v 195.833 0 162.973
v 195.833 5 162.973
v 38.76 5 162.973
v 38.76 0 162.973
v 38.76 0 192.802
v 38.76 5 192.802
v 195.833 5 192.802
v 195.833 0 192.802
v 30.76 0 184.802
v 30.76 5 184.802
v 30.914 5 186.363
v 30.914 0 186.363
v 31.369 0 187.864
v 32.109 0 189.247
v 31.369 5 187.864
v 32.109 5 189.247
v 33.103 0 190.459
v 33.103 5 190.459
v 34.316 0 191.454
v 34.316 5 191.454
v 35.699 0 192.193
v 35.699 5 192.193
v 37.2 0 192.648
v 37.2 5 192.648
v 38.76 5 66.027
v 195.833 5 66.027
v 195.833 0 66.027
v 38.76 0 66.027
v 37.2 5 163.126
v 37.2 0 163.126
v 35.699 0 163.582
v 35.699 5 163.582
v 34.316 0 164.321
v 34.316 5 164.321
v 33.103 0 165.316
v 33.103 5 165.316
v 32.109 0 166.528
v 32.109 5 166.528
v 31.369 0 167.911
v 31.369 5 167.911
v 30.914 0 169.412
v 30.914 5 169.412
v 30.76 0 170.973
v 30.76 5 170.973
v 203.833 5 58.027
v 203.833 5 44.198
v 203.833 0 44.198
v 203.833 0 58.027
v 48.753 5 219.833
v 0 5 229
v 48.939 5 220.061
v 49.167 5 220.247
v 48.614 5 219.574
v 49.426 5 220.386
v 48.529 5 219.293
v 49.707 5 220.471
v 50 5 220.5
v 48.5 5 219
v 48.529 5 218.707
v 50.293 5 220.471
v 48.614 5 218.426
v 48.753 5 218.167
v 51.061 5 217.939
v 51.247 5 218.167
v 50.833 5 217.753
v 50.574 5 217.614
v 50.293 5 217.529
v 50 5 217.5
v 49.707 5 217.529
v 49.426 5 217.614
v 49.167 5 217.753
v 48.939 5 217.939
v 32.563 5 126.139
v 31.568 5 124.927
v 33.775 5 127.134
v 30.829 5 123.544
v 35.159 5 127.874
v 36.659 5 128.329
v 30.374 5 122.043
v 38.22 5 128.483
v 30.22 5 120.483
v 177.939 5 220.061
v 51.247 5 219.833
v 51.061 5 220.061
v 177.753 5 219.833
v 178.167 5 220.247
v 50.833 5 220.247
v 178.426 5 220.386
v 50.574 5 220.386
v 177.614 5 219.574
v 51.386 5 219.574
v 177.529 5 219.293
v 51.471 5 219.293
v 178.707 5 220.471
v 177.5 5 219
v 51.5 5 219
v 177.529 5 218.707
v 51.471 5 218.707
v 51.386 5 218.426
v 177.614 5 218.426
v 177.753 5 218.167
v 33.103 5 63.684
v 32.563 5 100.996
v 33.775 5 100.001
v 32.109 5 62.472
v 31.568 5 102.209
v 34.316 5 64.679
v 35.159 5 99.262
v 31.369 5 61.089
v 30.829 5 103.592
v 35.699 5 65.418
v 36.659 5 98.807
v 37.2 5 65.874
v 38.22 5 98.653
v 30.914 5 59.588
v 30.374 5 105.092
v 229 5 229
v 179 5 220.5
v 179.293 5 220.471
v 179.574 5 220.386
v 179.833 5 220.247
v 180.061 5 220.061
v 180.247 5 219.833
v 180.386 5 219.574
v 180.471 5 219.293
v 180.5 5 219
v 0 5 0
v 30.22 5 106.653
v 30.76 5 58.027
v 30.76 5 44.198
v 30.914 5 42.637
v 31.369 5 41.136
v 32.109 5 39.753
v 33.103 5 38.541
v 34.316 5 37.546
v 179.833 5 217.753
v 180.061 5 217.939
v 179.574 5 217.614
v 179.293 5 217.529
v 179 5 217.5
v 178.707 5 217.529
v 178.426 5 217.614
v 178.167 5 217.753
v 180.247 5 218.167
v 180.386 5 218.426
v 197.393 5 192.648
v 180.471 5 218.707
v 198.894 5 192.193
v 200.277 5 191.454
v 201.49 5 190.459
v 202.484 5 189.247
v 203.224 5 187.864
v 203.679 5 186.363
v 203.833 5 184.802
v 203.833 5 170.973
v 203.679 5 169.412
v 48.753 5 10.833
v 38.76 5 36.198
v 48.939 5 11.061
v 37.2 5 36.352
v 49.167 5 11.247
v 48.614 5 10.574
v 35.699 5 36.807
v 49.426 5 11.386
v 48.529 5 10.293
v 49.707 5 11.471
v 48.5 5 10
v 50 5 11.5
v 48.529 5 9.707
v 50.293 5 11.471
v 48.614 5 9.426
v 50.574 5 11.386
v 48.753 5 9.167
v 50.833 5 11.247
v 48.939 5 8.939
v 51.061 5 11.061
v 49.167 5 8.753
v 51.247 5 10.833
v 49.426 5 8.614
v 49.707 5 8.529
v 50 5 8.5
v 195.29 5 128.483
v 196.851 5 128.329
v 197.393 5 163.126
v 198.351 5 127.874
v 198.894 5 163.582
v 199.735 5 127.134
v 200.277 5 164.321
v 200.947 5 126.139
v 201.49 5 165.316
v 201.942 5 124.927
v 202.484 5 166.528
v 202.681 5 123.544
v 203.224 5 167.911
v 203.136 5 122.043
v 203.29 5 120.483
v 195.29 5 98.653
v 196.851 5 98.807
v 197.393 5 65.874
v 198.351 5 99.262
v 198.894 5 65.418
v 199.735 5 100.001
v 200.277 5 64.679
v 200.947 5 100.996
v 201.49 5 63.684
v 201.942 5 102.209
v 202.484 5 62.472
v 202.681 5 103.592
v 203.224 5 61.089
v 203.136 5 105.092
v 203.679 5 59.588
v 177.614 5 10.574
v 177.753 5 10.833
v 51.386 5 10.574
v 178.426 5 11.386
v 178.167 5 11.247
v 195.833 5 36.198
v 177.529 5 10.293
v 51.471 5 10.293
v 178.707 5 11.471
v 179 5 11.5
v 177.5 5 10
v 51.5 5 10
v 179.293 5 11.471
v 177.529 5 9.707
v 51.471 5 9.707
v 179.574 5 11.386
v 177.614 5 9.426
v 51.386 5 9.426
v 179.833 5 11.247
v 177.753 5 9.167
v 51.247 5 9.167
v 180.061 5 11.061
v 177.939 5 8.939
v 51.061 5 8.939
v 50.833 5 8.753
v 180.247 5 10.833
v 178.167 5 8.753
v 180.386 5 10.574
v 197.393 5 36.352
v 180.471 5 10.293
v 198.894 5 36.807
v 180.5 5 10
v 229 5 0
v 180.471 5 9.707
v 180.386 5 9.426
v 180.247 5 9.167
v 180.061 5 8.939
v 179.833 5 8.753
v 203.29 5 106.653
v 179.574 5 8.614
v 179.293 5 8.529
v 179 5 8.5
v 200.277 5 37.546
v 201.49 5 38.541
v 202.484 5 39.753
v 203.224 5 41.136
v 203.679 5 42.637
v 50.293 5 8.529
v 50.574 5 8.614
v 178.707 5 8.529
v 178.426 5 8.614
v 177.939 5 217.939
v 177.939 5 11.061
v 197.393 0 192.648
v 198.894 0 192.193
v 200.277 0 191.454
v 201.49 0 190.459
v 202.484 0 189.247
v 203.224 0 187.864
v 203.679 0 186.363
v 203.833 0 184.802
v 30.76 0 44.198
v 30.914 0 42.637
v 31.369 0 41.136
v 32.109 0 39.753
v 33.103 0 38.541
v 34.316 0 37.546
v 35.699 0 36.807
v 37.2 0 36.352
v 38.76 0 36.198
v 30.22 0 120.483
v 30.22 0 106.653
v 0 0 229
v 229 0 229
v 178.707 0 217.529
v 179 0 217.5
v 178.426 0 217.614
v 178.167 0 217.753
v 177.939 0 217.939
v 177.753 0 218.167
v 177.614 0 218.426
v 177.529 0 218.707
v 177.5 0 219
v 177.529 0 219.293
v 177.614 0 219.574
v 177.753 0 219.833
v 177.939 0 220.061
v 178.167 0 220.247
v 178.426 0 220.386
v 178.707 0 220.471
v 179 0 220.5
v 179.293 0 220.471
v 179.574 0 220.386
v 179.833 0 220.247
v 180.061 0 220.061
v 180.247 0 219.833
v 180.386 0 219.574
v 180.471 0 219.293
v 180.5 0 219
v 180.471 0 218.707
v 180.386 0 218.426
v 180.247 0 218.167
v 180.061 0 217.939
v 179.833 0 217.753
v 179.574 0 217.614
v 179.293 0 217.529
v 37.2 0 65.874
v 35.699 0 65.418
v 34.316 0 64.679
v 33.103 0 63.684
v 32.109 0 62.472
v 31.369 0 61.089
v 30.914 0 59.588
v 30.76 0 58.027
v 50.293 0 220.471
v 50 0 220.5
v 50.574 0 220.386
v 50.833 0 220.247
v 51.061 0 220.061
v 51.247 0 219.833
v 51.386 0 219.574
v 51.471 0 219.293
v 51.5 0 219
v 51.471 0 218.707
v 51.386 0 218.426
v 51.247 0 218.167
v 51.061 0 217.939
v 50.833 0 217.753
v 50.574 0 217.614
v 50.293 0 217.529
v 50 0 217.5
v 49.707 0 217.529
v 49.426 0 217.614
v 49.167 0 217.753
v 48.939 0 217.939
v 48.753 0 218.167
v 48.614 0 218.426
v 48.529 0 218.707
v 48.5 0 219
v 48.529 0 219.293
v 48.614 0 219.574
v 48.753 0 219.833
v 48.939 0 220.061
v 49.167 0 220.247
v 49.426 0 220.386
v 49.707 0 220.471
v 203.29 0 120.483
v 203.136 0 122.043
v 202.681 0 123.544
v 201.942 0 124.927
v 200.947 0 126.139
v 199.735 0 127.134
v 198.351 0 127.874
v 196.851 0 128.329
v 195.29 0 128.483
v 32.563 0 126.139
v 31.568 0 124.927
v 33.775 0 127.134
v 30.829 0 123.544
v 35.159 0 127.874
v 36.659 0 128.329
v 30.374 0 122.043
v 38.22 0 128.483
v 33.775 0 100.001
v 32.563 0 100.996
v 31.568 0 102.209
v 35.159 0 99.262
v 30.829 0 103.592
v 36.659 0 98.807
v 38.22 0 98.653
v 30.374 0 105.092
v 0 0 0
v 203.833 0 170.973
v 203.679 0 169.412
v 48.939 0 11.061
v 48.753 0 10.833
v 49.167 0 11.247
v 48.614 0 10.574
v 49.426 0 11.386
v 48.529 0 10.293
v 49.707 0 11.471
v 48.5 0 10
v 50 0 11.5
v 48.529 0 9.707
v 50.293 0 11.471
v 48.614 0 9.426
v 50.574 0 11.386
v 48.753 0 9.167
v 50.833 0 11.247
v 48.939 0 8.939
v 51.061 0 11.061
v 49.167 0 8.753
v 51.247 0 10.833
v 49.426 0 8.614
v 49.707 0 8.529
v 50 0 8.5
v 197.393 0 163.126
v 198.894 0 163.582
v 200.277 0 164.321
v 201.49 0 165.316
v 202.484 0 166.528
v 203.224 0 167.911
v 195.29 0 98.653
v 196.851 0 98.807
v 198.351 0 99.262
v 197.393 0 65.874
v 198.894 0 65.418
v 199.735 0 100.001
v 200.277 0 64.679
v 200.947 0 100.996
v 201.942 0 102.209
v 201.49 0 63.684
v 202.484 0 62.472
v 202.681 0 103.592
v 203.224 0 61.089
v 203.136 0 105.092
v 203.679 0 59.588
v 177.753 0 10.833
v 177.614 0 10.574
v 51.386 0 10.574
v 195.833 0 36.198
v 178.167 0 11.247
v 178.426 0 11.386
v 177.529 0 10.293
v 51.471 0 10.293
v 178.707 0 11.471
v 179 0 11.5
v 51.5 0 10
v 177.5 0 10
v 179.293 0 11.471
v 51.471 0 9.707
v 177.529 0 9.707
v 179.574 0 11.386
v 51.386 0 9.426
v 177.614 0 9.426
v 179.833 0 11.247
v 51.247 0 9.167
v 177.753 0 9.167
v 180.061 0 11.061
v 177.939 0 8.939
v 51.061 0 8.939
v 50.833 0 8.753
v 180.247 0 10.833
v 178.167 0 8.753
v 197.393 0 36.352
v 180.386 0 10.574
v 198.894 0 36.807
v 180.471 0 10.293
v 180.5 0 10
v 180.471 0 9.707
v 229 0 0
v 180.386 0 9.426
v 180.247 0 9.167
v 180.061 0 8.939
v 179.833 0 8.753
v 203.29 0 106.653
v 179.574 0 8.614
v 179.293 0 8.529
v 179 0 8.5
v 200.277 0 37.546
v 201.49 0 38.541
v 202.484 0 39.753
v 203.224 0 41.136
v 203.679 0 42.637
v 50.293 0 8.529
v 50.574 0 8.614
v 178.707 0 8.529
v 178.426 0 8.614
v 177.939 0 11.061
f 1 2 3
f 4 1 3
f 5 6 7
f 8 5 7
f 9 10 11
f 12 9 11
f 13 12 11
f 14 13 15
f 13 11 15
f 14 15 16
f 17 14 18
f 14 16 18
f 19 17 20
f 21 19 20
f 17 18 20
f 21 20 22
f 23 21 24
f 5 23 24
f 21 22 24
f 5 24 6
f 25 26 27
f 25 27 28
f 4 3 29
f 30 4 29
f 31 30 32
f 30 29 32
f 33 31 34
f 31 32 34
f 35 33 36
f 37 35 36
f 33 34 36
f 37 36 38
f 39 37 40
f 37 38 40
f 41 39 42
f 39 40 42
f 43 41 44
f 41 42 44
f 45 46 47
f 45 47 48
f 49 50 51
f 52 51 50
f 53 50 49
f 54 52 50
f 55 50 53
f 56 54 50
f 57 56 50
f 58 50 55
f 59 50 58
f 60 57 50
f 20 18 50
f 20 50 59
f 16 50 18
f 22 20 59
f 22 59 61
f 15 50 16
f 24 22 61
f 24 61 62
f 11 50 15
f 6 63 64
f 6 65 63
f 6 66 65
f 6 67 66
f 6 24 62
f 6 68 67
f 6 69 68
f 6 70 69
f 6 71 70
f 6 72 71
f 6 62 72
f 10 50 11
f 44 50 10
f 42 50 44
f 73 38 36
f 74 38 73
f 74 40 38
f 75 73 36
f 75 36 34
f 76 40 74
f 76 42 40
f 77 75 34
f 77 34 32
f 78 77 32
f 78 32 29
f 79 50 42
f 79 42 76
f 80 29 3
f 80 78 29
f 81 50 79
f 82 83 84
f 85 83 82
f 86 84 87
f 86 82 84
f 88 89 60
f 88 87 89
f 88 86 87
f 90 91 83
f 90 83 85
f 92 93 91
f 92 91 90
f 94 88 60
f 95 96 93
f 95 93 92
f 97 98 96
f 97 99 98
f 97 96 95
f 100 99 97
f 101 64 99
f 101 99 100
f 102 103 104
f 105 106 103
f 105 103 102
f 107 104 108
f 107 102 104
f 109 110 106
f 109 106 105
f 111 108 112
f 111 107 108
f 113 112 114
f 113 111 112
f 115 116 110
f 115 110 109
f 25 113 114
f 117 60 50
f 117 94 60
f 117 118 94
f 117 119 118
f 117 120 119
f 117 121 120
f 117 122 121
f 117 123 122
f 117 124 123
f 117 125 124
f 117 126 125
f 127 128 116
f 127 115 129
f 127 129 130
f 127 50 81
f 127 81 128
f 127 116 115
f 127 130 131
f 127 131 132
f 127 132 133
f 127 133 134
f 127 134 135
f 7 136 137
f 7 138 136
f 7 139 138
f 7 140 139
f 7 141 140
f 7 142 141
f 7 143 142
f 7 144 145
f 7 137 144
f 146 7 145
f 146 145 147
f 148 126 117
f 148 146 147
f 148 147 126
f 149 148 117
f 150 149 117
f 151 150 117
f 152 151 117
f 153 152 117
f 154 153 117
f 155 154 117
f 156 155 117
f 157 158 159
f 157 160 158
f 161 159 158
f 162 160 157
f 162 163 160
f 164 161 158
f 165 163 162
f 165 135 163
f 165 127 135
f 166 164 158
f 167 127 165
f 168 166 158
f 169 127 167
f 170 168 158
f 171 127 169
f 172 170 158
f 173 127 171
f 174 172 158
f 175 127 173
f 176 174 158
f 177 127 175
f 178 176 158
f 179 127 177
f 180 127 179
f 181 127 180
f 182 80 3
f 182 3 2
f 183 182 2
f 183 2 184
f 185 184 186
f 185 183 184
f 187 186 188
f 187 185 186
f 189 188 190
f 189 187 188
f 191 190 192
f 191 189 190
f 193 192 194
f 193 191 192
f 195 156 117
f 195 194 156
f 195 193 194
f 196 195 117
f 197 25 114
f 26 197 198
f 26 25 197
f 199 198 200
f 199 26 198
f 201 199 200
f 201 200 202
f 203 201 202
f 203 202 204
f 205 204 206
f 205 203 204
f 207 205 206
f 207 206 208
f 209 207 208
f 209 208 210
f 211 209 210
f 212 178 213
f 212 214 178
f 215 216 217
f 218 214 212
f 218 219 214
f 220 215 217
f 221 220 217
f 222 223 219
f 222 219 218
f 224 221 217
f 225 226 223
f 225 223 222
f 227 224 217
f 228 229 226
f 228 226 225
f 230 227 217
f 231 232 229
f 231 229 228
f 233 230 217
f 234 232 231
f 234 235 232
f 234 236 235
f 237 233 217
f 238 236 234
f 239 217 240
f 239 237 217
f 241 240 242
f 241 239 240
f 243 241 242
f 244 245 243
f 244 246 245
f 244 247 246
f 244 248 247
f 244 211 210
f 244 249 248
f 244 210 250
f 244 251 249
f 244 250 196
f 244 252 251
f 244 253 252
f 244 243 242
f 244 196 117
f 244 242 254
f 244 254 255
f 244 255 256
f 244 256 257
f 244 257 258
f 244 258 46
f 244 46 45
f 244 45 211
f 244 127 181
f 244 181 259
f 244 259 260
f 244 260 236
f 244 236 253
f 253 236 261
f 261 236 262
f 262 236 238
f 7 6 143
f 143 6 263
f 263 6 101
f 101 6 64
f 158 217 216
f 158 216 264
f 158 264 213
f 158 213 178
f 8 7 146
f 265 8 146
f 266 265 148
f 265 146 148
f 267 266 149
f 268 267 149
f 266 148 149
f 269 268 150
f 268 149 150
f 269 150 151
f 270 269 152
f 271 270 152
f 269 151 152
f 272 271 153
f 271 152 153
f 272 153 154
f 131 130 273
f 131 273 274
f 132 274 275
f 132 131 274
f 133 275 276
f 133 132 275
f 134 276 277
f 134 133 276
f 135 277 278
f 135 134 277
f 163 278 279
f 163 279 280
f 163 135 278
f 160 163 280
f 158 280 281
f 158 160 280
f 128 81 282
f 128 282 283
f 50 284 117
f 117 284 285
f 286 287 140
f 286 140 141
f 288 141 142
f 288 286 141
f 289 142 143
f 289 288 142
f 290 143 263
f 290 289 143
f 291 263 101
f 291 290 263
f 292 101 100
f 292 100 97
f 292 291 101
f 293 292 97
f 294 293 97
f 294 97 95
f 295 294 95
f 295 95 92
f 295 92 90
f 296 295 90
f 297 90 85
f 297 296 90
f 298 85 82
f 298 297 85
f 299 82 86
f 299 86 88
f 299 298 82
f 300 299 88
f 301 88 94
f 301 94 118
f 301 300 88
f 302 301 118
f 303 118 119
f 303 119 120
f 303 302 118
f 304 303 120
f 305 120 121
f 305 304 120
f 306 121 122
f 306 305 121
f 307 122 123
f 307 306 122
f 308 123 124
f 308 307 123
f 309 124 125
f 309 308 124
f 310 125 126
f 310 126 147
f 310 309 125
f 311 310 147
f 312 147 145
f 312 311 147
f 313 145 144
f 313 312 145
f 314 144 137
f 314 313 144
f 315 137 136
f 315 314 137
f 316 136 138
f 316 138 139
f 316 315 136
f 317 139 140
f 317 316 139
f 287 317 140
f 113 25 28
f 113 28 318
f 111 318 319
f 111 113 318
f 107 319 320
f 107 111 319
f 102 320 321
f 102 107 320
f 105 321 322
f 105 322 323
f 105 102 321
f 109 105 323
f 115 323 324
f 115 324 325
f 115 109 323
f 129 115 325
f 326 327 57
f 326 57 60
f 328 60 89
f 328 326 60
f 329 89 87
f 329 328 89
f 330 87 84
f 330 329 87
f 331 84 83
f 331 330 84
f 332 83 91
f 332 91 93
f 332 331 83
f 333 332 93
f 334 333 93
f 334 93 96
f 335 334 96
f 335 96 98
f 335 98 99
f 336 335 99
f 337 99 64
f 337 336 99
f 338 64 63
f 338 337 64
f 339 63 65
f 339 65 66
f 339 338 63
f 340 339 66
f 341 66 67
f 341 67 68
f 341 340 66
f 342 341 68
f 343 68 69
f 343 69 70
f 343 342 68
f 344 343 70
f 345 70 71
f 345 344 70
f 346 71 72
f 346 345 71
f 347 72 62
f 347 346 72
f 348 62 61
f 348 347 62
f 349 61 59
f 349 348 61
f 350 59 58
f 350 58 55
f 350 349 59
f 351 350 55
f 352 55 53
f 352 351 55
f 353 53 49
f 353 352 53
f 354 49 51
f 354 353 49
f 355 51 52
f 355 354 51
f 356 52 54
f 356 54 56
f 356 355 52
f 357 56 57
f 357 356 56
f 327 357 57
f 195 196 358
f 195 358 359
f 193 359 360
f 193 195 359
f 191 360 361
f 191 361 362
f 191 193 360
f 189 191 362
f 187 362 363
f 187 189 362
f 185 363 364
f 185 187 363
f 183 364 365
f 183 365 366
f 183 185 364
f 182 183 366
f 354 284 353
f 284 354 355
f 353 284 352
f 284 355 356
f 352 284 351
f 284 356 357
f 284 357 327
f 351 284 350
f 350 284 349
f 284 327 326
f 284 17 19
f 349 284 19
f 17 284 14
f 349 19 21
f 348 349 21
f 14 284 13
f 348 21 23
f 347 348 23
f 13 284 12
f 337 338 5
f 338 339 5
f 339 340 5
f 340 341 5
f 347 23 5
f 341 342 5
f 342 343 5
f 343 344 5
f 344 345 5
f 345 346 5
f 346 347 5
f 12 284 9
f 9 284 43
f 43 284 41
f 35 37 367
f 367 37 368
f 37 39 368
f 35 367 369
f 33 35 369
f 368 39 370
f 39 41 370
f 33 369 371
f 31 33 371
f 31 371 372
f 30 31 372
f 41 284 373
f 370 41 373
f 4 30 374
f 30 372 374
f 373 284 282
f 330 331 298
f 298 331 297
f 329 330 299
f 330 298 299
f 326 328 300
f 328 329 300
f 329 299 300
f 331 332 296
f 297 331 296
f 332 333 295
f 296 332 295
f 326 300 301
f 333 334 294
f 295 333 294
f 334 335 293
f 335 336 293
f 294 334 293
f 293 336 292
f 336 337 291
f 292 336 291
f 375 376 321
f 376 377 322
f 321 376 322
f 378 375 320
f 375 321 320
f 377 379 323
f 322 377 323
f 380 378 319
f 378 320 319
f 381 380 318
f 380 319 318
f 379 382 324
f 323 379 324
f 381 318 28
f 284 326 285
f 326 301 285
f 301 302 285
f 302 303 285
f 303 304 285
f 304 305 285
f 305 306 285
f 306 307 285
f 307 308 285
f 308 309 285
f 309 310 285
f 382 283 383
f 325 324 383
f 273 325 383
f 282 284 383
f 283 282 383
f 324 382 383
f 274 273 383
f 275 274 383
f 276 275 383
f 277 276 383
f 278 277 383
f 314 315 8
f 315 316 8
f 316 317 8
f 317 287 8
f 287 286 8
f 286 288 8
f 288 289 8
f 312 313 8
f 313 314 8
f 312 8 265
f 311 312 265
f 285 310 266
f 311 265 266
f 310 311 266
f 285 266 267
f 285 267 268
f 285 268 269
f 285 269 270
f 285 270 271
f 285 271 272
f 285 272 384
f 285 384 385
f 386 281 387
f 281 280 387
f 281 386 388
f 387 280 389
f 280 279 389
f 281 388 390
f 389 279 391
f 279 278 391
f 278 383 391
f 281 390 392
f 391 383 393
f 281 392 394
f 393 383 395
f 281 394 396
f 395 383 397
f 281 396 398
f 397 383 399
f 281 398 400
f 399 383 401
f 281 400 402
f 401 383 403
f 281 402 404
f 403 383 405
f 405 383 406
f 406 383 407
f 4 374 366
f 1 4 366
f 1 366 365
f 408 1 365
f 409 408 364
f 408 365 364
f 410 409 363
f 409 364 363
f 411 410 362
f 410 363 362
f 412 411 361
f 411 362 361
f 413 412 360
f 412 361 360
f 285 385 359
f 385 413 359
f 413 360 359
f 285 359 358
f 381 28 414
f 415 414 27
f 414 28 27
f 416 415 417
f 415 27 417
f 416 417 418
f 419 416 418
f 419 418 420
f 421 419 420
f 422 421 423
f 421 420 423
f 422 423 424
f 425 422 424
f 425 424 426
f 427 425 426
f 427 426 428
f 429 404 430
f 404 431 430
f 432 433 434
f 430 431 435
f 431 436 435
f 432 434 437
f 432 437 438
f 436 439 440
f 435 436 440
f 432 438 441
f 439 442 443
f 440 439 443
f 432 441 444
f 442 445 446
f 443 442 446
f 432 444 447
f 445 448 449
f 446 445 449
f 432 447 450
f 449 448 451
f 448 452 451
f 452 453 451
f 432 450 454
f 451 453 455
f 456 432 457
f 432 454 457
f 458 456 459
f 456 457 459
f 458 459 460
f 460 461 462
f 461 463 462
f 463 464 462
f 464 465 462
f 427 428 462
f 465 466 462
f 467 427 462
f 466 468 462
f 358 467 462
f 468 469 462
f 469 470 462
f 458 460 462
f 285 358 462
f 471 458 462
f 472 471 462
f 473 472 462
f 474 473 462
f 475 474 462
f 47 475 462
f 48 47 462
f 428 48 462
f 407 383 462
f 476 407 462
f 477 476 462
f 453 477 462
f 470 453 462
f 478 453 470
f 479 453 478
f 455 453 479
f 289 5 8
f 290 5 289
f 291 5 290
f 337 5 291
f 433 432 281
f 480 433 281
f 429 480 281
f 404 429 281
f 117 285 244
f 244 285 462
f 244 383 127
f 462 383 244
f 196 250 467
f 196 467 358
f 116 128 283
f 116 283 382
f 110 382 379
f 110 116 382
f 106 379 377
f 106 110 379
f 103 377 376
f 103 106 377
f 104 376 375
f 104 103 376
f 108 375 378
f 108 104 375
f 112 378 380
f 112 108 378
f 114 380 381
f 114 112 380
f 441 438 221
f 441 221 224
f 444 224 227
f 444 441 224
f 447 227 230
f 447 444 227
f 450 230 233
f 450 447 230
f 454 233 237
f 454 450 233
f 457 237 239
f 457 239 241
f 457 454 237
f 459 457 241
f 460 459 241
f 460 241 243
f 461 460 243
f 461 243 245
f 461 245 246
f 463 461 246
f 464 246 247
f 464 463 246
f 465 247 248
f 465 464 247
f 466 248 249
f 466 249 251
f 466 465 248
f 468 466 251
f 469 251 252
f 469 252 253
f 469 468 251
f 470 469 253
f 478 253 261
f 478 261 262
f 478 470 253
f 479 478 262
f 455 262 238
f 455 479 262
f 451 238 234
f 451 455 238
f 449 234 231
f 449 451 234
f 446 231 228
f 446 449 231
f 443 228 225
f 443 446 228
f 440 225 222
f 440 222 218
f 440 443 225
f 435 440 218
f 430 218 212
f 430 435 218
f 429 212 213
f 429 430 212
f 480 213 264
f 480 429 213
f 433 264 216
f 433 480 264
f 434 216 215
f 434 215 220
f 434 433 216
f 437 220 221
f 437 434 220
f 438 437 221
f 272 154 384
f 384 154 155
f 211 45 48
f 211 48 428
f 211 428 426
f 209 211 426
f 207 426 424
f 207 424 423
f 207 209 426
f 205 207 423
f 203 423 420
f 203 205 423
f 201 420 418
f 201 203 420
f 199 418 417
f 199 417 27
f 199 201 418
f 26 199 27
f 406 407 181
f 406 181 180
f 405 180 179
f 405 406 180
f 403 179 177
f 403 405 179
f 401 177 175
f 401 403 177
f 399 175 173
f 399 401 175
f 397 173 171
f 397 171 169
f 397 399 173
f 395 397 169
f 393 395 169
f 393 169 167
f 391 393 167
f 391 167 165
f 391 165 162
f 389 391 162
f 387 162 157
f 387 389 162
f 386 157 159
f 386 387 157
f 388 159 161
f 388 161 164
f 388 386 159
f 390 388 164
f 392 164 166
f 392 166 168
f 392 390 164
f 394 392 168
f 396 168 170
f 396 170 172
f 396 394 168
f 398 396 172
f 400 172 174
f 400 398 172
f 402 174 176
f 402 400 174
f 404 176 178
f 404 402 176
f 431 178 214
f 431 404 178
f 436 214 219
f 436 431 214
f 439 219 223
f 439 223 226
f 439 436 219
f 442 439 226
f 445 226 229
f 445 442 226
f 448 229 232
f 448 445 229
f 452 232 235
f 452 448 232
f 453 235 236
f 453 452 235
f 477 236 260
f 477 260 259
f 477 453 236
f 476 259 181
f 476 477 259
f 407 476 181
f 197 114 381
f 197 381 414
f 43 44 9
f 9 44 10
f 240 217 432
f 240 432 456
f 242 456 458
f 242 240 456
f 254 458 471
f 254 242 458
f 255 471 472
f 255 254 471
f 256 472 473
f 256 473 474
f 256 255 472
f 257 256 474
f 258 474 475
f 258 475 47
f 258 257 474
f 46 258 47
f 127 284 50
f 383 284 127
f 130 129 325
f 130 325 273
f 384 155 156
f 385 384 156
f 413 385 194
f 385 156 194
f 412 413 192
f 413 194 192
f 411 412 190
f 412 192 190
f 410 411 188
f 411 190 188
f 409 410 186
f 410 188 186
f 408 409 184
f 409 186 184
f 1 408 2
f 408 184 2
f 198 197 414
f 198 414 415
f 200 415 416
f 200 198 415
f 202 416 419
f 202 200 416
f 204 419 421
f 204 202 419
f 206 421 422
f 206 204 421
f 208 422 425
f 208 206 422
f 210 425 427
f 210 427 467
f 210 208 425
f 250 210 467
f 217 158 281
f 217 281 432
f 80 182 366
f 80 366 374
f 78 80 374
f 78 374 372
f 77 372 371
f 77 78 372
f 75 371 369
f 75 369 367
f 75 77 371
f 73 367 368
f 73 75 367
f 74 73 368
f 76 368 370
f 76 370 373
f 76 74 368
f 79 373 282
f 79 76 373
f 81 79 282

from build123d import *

# Parameters (mm, degrees)
SKETCH1_W           = 229
SKETCH1_H           = 229
SKETCH1_R           = 1.5
BOSS_EXTRUDE1_DEPTH = 5
CUT_EXTRUDE1_DEPTH  = 5


with BuildPart() as part:
    # Sketch1 → Boss-Extrude1 (new body)
    with BuildSketch(Plane(origin=(0, 0, 0), x_dir=(1, 0, 0), z_dir=(0, 1, 0))):
        with Locations((114.5, -114.5)):
            Rectangle(SKETCH1_W, SKETCH1_H)
        with Locations(Location((179, -10, 0), (0, 0, 270))):
            Circle(SKETCH1_R, mode=Mode.SUBTRACT)
        with Locations(Location((50, -10, 0), (0, 0, 90))):
            Circle(SKETCH1_R, mode=Mode.SUBTRACT)
        with Locations(Location((179, -219, 0), (0, 0, 90))):
            Circle(SKETCH1_R, mode=Mode.SUBTRACT)
        with Locations(Location((50, -219, 0), (0, 0, 270))):
            Circle(SKETCH1_R, mode=Mode.SUBTRACT)
    extrude(amount=BOSS_EXTRUDE1_DEPTH)

    # Sketch2 → Cut-Extrude1 (cut)
    with BuildSketch(Plane(origin=(0, 5, 0), x_dir=(1, 0, 0), z_dir=(0, 1, 0))):
        with BuildLine():
            Line((38.760316137, -36.197957946), (195.832686867, -36.197957946))
            ThreePointArc((195.832686867, -36.197957946), (201.489541116, -38.541103697), (203.832686867, -44.197957946))
            Line((203.832686867, -44.197957946), (203.832686867, -58.0273073))
            ThreePointArc((203.832686867, -58.0273073), (201.489541116, -63.68416155), (195.832686867, -66.0273073))
            Line((195.832686867, -66.0273073), (38.760316137, -66.0273073))
            ThreePointArc((38.760316137, -66.0273073), (33.103461887, -63.68416155), (30.760316137, -58.0273073))
            Line((30.760316137, -58.0273073), (30.760316137, -44.197957946))
            ThreePointArc((30.760316137, -44.197957946), (33.103461887, -38.541103697), (38.760316137, -36.197957946))
        make_face()
        with BuildLine():
            Line((203.832686867, -184.802042054), (203.832686867, -170.9726927))
            ThreePointArc((203.832686867, -170.9726927), (201.489541116, -165.31583845), (195.832686867, -162.9726927))
            Line((195.832686867, -162.9726927), (38.760316137, -162.9726927))
            ThreePointArc((38.760316137, -162.9726927), (33.103461887, -165.31583845), (30.760316137, -170.9726927))
            Line((30.760316137, -170.9726927), (30.760316137, -184.802042054))
            ThreePointArc((30.760316137, -184.802042054), (33.103461887, -190.458896303), (38.760316137, -192.802042054))
            Line((38.760316137, -192.802042054), (195.832686867, -192.802042054))
            ThreePointArc((195.832686867, -192.802042054), (201.489541116, -190.458896303), (203.832686867, -184.802042054))
        make_face()
        with BuildLine():
            Line((38.22, -98.653158156), (195.29, -98.653158156))
            ThreePointArc((195.29, -98.653158156), (200.946854249, -100.996303906), (203.29, -106.653158156))
            Line((203.29, -106.653158156), (203.29, -120.48250751))
            ThreePointArc((203.29, -120.48250751), (200.946854249, -126.139361759), (195.29, -128.48250751))
            Line((195.29, -128.48250751), (38.22, -128.48250751))
            ThreePointArc((38.22, -128.48250751), (32.563145751, -126.139361759), (30.22, -120.48250751))
            Line((30.22, -120.48250751), (30.22, -106.653158156))
            ThreePointArc((30.22, -106.653158156), (32.563145751, -100.996303906), (38.22, -98.653158156))
        make_face()
    extrude(amount=-CUT_EXTRUDE1_DEPTH, mode=Mode.SUBTRACT)


solid = part.part
